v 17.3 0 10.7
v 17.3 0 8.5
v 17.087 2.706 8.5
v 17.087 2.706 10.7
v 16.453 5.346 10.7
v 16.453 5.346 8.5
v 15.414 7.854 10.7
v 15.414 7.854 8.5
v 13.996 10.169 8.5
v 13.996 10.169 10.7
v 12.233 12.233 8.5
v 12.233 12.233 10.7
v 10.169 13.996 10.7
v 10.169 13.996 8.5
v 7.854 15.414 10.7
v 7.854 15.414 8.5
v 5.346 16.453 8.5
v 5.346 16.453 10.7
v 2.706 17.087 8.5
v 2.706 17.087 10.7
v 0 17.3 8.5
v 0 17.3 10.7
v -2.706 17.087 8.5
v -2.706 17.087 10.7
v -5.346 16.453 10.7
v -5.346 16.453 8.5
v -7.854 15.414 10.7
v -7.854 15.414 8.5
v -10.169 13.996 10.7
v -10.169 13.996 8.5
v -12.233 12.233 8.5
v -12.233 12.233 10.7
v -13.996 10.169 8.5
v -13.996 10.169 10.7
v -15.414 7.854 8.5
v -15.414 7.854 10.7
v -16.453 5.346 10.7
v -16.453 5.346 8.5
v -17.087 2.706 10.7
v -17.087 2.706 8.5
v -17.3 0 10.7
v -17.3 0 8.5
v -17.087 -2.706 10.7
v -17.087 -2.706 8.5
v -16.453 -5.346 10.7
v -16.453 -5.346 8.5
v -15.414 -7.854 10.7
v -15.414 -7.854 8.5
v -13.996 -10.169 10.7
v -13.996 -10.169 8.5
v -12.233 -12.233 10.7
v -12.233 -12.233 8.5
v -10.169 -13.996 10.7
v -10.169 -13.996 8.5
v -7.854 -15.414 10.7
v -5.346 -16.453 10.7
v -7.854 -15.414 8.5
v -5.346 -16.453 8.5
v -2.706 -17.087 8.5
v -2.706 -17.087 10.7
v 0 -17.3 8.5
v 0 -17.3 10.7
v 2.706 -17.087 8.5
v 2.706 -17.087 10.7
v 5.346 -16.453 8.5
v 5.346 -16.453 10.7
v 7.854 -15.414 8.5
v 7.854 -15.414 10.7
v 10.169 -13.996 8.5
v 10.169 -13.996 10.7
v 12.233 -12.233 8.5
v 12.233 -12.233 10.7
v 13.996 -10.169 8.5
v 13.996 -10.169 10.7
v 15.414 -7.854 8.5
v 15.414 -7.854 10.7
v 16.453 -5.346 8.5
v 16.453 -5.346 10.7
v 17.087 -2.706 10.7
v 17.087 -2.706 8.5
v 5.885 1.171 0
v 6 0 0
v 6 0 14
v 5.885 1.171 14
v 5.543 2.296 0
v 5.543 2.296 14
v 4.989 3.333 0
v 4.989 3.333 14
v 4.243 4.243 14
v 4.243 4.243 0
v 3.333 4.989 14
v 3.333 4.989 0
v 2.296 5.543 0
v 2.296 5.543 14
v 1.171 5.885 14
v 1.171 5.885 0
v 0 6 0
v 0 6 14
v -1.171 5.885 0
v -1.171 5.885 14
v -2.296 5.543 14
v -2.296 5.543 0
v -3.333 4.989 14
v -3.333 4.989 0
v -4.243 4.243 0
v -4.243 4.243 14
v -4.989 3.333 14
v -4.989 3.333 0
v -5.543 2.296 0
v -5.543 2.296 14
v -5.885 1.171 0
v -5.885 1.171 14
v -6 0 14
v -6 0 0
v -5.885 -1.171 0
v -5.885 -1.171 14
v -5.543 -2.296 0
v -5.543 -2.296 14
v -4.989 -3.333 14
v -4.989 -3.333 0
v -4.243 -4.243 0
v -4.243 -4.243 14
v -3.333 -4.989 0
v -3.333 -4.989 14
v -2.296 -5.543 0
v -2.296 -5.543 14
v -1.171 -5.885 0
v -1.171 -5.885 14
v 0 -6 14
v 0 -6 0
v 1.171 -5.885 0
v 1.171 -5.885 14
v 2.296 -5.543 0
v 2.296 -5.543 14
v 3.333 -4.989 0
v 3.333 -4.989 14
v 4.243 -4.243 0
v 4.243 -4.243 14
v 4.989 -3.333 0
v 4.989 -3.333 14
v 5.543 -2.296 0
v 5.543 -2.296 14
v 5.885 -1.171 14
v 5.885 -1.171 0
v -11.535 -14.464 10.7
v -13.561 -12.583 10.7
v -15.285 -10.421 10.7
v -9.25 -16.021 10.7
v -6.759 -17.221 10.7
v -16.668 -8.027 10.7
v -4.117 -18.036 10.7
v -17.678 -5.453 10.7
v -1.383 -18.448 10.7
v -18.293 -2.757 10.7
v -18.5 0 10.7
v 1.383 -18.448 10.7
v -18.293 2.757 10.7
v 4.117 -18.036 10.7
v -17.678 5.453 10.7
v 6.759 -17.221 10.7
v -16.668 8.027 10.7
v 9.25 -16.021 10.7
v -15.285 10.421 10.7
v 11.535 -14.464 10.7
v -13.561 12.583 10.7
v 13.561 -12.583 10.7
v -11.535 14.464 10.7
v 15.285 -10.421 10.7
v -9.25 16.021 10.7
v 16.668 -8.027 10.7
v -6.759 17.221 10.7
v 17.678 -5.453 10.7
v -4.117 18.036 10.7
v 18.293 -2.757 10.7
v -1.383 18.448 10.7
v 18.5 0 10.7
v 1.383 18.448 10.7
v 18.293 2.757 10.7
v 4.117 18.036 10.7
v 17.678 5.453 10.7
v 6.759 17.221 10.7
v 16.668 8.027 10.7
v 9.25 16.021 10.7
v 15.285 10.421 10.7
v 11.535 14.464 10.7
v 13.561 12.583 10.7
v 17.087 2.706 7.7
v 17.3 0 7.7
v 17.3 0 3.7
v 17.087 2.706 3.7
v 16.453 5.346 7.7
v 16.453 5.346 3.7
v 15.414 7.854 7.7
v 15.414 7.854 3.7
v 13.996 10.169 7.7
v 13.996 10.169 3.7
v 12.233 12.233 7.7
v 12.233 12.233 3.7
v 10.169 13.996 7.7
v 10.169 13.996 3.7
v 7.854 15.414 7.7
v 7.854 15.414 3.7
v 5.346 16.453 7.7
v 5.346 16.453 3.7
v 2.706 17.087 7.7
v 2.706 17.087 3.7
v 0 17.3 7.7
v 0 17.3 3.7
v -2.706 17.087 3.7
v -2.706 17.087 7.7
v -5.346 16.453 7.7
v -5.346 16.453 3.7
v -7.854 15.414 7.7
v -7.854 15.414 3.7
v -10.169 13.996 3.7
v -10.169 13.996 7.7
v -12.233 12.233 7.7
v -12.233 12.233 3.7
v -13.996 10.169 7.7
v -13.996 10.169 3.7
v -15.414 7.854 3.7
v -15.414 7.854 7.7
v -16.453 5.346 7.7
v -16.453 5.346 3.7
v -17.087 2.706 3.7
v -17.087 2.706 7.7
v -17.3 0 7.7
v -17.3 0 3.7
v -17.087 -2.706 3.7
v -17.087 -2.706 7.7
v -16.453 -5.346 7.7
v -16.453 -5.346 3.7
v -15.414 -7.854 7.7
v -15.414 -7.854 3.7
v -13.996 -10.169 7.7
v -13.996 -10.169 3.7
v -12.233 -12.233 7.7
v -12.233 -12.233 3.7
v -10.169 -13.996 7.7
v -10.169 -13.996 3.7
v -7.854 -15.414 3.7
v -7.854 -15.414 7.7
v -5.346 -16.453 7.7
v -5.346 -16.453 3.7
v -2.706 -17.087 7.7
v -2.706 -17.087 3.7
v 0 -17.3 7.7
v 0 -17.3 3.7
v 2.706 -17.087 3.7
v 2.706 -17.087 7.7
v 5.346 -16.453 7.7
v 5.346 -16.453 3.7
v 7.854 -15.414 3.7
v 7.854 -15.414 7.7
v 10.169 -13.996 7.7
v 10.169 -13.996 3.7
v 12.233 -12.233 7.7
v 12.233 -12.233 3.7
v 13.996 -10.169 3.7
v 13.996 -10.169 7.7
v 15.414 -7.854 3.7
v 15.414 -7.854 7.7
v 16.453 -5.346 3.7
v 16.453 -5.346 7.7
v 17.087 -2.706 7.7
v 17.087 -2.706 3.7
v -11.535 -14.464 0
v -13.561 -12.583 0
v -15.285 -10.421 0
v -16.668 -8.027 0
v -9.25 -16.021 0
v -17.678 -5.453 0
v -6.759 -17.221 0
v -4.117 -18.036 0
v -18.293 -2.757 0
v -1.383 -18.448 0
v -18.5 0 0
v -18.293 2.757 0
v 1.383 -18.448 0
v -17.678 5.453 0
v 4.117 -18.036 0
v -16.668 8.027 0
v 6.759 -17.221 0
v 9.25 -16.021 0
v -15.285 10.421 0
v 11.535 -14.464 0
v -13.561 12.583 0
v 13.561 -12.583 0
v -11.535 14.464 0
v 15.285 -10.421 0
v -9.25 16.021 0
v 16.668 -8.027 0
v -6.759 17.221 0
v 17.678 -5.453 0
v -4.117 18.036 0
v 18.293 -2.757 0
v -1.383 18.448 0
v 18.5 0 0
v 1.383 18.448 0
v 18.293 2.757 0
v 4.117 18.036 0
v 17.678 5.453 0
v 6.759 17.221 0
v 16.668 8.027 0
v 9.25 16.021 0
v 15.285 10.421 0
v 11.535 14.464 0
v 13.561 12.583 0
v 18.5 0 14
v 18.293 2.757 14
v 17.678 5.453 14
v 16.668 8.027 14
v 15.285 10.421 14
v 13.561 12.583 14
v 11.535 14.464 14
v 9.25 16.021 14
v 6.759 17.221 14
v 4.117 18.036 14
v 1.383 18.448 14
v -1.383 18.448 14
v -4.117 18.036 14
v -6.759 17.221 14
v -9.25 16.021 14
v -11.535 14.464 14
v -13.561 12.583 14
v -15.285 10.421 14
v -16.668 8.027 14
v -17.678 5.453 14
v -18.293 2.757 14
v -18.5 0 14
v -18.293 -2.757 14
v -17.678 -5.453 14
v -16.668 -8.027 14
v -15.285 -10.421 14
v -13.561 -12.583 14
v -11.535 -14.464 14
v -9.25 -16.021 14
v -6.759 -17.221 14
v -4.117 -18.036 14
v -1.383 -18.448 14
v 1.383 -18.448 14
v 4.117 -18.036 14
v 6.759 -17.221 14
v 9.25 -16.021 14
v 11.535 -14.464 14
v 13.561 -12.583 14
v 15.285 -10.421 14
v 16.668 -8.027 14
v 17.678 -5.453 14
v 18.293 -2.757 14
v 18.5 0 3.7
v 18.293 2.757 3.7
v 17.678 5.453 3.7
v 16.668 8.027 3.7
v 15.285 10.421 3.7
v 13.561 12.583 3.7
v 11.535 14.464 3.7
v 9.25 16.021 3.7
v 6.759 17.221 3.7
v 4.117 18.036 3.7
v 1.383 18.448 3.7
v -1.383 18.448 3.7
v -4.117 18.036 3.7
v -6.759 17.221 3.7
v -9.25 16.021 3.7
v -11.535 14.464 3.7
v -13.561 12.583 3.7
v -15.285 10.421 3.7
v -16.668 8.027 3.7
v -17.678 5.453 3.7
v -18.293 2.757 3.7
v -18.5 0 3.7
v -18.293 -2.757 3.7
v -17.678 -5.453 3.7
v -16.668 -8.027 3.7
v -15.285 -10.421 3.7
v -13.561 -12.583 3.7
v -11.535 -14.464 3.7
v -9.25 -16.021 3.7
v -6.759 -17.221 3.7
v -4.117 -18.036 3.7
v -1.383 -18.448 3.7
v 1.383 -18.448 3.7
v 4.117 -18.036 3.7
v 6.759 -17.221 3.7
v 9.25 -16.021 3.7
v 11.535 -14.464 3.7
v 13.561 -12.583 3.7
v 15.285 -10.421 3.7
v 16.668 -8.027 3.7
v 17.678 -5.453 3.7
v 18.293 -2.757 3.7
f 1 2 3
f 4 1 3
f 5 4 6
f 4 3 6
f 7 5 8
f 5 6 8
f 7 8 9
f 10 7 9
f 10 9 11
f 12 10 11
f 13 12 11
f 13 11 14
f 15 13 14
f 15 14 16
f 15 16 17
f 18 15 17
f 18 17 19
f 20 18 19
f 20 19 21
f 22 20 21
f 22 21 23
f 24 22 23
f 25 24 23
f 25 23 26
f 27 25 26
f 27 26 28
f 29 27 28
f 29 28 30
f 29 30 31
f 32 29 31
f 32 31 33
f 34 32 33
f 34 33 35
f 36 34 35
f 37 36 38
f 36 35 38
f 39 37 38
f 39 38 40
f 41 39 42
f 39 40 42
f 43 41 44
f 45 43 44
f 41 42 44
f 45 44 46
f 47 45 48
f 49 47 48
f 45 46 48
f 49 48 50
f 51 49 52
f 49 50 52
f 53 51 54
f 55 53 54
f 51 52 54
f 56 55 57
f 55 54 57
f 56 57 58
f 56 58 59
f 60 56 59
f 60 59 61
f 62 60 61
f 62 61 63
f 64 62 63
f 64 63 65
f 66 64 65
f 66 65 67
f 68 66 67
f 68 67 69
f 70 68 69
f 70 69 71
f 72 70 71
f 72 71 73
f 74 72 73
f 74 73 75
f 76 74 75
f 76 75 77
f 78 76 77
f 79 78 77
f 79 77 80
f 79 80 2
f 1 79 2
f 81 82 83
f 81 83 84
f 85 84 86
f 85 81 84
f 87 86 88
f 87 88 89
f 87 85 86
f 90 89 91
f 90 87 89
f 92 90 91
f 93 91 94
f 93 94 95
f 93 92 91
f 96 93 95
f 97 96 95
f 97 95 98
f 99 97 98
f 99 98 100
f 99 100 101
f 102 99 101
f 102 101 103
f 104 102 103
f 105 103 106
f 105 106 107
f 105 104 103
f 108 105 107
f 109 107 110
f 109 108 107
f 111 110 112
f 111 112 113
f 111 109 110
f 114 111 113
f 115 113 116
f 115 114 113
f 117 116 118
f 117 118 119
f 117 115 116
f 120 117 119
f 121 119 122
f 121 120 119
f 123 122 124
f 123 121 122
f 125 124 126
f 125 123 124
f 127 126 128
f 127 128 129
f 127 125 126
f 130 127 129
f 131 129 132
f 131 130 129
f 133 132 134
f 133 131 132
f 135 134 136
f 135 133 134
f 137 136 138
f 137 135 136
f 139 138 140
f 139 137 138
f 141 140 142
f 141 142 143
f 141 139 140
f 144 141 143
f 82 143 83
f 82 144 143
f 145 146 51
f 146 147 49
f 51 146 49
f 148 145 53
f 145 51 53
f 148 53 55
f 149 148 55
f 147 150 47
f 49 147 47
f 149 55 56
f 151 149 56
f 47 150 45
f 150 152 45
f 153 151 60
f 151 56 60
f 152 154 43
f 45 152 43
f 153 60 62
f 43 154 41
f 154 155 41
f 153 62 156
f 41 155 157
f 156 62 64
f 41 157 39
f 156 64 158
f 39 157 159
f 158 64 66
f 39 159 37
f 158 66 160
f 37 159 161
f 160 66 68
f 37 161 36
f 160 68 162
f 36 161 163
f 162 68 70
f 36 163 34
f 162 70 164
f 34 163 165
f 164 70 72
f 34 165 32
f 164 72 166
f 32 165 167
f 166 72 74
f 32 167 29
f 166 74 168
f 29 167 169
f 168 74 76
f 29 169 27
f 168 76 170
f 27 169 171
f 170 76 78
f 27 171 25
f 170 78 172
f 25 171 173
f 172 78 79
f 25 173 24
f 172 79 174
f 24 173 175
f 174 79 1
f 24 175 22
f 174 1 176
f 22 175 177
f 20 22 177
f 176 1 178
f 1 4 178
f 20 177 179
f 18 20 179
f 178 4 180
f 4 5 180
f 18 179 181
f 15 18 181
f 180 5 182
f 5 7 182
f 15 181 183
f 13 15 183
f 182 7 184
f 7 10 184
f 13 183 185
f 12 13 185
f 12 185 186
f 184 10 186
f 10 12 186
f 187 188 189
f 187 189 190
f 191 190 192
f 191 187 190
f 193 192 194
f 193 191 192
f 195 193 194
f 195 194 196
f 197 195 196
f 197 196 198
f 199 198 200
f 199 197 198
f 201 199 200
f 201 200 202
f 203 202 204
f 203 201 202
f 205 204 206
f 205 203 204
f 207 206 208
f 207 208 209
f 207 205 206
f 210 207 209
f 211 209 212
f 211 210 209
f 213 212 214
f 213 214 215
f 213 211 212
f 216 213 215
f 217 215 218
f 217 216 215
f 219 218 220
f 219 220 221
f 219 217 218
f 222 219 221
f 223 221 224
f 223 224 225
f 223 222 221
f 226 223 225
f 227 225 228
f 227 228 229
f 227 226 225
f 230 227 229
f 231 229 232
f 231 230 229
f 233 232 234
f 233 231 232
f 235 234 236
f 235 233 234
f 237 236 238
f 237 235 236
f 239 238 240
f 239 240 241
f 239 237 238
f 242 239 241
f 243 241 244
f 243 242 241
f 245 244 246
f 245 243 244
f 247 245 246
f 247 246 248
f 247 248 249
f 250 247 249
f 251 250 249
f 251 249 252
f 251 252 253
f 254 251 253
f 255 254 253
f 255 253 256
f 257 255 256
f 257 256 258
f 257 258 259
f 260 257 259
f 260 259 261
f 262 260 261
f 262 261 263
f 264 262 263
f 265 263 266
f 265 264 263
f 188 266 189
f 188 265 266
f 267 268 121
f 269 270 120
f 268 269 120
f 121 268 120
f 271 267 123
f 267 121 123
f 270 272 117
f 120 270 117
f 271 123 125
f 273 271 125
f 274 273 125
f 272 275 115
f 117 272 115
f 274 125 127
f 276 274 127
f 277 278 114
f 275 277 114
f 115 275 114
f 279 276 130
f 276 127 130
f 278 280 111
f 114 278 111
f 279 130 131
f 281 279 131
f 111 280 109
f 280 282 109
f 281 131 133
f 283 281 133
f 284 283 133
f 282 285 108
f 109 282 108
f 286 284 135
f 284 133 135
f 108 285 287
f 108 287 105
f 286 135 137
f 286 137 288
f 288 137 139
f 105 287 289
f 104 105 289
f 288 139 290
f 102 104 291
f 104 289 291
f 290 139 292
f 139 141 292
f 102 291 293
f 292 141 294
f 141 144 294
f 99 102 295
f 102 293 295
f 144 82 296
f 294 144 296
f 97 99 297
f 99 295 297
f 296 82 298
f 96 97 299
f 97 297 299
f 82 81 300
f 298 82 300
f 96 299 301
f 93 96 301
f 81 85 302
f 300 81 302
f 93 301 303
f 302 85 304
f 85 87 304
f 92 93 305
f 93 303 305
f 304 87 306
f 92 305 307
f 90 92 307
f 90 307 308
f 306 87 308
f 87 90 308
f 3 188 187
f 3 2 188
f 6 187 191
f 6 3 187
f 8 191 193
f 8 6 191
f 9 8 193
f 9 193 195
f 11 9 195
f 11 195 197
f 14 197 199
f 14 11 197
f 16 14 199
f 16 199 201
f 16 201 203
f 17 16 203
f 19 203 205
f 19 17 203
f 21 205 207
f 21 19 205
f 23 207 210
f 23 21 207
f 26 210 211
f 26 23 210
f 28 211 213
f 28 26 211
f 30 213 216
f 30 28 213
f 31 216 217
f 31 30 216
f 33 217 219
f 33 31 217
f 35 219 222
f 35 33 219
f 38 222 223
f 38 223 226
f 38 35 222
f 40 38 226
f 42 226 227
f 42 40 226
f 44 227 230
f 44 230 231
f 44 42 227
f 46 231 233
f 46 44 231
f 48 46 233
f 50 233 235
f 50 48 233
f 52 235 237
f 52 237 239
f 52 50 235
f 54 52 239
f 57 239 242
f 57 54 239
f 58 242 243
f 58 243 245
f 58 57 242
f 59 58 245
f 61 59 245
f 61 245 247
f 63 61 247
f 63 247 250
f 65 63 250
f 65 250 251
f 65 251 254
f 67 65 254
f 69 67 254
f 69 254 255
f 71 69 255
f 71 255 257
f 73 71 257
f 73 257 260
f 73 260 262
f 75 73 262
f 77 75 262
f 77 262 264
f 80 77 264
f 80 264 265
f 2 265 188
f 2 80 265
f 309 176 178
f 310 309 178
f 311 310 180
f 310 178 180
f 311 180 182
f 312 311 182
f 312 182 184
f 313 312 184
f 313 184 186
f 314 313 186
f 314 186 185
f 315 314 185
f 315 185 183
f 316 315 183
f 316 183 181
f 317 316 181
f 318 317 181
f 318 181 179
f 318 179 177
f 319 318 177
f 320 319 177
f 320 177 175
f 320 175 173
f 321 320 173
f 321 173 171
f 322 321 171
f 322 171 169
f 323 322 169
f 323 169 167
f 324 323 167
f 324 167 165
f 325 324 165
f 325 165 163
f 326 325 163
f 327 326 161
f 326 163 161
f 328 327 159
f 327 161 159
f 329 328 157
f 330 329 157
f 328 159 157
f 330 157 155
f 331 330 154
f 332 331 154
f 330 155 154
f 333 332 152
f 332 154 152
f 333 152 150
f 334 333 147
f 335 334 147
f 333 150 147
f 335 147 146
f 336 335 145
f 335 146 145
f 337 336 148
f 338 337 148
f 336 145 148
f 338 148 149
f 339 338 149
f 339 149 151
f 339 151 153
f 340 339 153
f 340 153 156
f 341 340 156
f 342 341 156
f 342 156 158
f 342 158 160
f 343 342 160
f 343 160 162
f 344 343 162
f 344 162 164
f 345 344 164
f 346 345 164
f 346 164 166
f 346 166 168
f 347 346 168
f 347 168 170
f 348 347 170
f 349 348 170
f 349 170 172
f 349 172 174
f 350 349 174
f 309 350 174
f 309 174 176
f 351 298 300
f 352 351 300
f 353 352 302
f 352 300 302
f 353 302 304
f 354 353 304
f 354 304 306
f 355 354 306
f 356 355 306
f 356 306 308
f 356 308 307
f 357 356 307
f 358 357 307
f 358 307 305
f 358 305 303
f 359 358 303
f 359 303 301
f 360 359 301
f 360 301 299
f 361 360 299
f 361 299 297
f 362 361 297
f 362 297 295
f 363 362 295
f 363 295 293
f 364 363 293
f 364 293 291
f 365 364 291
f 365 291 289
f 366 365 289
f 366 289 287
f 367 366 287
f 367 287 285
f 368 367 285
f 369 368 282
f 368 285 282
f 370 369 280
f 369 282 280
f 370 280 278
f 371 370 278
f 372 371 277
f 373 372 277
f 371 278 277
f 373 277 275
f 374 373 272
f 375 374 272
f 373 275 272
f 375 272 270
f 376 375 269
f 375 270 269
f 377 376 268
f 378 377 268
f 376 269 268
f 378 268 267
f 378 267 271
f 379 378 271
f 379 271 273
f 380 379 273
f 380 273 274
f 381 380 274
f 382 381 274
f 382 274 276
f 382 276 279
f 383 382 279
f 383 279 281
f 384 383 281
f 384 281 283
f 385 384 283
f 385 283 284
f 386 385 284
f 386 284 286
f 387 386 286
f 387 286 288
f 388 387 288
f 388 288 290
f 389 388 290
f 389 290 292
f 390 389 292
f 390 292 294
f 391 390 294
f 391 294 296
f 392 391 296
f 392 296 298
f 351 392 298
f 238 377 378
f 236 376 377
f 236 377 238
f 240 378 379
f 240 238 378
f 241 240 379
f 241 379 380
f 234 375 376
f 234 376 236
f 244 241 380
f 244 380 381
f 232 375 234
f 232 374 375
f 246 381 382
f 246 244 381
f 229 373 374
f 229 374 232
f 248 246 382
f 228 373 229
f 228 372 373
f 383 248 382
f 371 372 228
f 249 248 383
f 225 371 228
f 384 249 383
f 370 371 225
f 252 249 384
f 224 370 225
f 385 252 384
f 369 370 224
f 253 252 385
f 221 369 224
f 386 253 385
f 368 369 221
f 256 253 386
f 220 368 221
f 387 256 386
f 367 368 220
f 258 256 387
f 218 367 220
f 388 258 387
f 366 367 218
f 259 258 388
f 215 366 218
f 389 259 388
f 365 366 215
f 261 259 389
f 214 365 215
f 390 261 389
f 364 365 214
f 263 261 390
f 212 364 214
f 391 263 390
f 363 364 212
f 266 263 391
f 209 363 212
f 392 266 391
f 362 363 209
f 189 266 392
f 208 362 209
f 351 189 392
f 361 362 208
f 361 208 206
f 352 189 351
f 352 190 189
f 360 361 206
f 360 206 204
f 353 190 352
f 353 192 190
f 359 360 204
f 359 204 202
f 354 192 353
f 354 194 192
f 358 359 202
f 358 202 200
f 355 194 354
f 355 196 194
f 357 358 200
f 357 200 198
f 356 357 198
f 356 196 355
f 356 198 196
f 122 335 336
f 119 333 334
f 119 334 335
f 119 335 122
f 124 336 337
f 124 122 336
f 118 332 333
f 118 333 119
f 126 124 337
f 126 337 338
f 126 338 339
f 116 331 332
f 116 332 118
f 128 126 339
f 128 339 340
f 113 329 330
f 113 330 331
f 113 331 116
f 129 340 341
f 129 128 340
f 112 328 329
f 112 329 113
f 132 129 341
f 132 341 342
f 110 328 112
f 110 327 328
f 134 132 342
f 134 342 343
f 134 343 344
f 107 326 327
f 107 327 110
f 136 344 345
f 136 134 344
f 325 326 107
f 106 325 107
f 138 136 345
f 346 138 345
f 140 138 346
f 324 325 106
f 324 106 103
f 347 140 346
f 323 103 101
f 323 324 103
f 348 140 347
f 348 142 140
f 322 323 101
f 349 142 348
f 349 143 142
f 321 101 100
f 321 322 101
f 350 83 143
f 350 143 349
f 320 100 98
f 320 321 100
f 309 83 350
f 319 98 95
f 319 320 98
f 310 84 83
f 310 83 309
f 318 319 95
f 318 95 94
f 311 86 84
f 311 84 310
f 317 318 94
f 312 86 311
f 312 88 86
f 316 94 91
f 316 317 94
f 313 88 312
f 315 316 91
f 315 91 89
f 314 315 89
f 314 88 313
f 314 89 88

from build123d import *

# Parameters (mm, degrees)
SKETCH_1_R          = 18.5
SKETCH_1_R_2        = 6
EXTRUDE_1_DEPTH     = 14
CUT_EXTRUDE_START   = -2.2
SKETCH_2_R          = 18.5
SKETCH_2_R_2        = 17.3
CUT_EXTRUDE_1_DEPTH = 2.2
SKETCH_2_2_R        = 18.5
SKETCH_2_2_R_2      = 17.3
CUT_EXTRUDE_2_DEPTH = 0.8
CUT_EXTRUDE_START_2 = -4
SKETCH_2_4_R        = 18.5
SKETCH_2_4_R_2      = 17.3
CUT_EXTRUDE_3_DEPTH = 4
SKETCH_2_6_R        = 18.5
SKETCH_2_6_R_2      = 17.3
CUT_EXTRUDE_5_DEPTH = 3


with BuildPart() as part:
    # 草图1 → 凸台-拉伸1 (new body)
    with BuildSketch(Plane.XY):
        Circle(SKETCH_1_R)
        Circle(SKETCH_1_R_2, mode=Mode.SUBTRACT)
    extrude(amount=EXTRUDE_1_DEPTH)

    # 草图2 → 切除-拉伸1 (cut)
    with BuildSketch(Plane.XY.offset(7.7).offset(CUT_EXTRUDE_START)):
        Circle(SKETCH_2_R)
        Circle(SKETCH_2_R_2, mode=Mode.SUBTRACT)
    extrude(amount=CUT_EXTRUDE_1_DEPTH, mode=Mode.SUBTRACT)

    # 草图2<2> → 切除-拉伸2 (cut)
    with BuildSketch(Plane.XY.offset(7.7)):
        Circle(SKETCH_2_2_R)
        Circle(SKETCH_2_2_R_2, mode=Mode.SUBTRACT)
    extrude(amount=CUT_EXTRUDE_2_DEPTH, mode=Mode.SUBTRACT)

    # 草图2<4> → 切除-拉伸3 (cut)
    with BuildSketch(Plane.XY.offset(7.7).offset(CUT_EXTRUDE_START_2)):
        Circle(SKETCH_2_4_R)
        Circle(SKETCH_2_4_R_2, mode=Mode.SUBTRACT)
    extrude(amount=CUT_EXTRUDE_3_DEPTH, mode=Mode.SUBTRACT)

    # 草图2<6> → 切除-拉伸5 (cut)
    with BuildSketch(Plane.XY.offset(7.7)):
        Circle(SKETCH_2_6_R)
        Circle(SKETCH_2_6_R_2, mode=Mode.SUBTRACT)
    extrude(amount=CUT_EXTRUDE_5_DEPTH, mode=Mode.SUBTRACT)


solid = part.part
